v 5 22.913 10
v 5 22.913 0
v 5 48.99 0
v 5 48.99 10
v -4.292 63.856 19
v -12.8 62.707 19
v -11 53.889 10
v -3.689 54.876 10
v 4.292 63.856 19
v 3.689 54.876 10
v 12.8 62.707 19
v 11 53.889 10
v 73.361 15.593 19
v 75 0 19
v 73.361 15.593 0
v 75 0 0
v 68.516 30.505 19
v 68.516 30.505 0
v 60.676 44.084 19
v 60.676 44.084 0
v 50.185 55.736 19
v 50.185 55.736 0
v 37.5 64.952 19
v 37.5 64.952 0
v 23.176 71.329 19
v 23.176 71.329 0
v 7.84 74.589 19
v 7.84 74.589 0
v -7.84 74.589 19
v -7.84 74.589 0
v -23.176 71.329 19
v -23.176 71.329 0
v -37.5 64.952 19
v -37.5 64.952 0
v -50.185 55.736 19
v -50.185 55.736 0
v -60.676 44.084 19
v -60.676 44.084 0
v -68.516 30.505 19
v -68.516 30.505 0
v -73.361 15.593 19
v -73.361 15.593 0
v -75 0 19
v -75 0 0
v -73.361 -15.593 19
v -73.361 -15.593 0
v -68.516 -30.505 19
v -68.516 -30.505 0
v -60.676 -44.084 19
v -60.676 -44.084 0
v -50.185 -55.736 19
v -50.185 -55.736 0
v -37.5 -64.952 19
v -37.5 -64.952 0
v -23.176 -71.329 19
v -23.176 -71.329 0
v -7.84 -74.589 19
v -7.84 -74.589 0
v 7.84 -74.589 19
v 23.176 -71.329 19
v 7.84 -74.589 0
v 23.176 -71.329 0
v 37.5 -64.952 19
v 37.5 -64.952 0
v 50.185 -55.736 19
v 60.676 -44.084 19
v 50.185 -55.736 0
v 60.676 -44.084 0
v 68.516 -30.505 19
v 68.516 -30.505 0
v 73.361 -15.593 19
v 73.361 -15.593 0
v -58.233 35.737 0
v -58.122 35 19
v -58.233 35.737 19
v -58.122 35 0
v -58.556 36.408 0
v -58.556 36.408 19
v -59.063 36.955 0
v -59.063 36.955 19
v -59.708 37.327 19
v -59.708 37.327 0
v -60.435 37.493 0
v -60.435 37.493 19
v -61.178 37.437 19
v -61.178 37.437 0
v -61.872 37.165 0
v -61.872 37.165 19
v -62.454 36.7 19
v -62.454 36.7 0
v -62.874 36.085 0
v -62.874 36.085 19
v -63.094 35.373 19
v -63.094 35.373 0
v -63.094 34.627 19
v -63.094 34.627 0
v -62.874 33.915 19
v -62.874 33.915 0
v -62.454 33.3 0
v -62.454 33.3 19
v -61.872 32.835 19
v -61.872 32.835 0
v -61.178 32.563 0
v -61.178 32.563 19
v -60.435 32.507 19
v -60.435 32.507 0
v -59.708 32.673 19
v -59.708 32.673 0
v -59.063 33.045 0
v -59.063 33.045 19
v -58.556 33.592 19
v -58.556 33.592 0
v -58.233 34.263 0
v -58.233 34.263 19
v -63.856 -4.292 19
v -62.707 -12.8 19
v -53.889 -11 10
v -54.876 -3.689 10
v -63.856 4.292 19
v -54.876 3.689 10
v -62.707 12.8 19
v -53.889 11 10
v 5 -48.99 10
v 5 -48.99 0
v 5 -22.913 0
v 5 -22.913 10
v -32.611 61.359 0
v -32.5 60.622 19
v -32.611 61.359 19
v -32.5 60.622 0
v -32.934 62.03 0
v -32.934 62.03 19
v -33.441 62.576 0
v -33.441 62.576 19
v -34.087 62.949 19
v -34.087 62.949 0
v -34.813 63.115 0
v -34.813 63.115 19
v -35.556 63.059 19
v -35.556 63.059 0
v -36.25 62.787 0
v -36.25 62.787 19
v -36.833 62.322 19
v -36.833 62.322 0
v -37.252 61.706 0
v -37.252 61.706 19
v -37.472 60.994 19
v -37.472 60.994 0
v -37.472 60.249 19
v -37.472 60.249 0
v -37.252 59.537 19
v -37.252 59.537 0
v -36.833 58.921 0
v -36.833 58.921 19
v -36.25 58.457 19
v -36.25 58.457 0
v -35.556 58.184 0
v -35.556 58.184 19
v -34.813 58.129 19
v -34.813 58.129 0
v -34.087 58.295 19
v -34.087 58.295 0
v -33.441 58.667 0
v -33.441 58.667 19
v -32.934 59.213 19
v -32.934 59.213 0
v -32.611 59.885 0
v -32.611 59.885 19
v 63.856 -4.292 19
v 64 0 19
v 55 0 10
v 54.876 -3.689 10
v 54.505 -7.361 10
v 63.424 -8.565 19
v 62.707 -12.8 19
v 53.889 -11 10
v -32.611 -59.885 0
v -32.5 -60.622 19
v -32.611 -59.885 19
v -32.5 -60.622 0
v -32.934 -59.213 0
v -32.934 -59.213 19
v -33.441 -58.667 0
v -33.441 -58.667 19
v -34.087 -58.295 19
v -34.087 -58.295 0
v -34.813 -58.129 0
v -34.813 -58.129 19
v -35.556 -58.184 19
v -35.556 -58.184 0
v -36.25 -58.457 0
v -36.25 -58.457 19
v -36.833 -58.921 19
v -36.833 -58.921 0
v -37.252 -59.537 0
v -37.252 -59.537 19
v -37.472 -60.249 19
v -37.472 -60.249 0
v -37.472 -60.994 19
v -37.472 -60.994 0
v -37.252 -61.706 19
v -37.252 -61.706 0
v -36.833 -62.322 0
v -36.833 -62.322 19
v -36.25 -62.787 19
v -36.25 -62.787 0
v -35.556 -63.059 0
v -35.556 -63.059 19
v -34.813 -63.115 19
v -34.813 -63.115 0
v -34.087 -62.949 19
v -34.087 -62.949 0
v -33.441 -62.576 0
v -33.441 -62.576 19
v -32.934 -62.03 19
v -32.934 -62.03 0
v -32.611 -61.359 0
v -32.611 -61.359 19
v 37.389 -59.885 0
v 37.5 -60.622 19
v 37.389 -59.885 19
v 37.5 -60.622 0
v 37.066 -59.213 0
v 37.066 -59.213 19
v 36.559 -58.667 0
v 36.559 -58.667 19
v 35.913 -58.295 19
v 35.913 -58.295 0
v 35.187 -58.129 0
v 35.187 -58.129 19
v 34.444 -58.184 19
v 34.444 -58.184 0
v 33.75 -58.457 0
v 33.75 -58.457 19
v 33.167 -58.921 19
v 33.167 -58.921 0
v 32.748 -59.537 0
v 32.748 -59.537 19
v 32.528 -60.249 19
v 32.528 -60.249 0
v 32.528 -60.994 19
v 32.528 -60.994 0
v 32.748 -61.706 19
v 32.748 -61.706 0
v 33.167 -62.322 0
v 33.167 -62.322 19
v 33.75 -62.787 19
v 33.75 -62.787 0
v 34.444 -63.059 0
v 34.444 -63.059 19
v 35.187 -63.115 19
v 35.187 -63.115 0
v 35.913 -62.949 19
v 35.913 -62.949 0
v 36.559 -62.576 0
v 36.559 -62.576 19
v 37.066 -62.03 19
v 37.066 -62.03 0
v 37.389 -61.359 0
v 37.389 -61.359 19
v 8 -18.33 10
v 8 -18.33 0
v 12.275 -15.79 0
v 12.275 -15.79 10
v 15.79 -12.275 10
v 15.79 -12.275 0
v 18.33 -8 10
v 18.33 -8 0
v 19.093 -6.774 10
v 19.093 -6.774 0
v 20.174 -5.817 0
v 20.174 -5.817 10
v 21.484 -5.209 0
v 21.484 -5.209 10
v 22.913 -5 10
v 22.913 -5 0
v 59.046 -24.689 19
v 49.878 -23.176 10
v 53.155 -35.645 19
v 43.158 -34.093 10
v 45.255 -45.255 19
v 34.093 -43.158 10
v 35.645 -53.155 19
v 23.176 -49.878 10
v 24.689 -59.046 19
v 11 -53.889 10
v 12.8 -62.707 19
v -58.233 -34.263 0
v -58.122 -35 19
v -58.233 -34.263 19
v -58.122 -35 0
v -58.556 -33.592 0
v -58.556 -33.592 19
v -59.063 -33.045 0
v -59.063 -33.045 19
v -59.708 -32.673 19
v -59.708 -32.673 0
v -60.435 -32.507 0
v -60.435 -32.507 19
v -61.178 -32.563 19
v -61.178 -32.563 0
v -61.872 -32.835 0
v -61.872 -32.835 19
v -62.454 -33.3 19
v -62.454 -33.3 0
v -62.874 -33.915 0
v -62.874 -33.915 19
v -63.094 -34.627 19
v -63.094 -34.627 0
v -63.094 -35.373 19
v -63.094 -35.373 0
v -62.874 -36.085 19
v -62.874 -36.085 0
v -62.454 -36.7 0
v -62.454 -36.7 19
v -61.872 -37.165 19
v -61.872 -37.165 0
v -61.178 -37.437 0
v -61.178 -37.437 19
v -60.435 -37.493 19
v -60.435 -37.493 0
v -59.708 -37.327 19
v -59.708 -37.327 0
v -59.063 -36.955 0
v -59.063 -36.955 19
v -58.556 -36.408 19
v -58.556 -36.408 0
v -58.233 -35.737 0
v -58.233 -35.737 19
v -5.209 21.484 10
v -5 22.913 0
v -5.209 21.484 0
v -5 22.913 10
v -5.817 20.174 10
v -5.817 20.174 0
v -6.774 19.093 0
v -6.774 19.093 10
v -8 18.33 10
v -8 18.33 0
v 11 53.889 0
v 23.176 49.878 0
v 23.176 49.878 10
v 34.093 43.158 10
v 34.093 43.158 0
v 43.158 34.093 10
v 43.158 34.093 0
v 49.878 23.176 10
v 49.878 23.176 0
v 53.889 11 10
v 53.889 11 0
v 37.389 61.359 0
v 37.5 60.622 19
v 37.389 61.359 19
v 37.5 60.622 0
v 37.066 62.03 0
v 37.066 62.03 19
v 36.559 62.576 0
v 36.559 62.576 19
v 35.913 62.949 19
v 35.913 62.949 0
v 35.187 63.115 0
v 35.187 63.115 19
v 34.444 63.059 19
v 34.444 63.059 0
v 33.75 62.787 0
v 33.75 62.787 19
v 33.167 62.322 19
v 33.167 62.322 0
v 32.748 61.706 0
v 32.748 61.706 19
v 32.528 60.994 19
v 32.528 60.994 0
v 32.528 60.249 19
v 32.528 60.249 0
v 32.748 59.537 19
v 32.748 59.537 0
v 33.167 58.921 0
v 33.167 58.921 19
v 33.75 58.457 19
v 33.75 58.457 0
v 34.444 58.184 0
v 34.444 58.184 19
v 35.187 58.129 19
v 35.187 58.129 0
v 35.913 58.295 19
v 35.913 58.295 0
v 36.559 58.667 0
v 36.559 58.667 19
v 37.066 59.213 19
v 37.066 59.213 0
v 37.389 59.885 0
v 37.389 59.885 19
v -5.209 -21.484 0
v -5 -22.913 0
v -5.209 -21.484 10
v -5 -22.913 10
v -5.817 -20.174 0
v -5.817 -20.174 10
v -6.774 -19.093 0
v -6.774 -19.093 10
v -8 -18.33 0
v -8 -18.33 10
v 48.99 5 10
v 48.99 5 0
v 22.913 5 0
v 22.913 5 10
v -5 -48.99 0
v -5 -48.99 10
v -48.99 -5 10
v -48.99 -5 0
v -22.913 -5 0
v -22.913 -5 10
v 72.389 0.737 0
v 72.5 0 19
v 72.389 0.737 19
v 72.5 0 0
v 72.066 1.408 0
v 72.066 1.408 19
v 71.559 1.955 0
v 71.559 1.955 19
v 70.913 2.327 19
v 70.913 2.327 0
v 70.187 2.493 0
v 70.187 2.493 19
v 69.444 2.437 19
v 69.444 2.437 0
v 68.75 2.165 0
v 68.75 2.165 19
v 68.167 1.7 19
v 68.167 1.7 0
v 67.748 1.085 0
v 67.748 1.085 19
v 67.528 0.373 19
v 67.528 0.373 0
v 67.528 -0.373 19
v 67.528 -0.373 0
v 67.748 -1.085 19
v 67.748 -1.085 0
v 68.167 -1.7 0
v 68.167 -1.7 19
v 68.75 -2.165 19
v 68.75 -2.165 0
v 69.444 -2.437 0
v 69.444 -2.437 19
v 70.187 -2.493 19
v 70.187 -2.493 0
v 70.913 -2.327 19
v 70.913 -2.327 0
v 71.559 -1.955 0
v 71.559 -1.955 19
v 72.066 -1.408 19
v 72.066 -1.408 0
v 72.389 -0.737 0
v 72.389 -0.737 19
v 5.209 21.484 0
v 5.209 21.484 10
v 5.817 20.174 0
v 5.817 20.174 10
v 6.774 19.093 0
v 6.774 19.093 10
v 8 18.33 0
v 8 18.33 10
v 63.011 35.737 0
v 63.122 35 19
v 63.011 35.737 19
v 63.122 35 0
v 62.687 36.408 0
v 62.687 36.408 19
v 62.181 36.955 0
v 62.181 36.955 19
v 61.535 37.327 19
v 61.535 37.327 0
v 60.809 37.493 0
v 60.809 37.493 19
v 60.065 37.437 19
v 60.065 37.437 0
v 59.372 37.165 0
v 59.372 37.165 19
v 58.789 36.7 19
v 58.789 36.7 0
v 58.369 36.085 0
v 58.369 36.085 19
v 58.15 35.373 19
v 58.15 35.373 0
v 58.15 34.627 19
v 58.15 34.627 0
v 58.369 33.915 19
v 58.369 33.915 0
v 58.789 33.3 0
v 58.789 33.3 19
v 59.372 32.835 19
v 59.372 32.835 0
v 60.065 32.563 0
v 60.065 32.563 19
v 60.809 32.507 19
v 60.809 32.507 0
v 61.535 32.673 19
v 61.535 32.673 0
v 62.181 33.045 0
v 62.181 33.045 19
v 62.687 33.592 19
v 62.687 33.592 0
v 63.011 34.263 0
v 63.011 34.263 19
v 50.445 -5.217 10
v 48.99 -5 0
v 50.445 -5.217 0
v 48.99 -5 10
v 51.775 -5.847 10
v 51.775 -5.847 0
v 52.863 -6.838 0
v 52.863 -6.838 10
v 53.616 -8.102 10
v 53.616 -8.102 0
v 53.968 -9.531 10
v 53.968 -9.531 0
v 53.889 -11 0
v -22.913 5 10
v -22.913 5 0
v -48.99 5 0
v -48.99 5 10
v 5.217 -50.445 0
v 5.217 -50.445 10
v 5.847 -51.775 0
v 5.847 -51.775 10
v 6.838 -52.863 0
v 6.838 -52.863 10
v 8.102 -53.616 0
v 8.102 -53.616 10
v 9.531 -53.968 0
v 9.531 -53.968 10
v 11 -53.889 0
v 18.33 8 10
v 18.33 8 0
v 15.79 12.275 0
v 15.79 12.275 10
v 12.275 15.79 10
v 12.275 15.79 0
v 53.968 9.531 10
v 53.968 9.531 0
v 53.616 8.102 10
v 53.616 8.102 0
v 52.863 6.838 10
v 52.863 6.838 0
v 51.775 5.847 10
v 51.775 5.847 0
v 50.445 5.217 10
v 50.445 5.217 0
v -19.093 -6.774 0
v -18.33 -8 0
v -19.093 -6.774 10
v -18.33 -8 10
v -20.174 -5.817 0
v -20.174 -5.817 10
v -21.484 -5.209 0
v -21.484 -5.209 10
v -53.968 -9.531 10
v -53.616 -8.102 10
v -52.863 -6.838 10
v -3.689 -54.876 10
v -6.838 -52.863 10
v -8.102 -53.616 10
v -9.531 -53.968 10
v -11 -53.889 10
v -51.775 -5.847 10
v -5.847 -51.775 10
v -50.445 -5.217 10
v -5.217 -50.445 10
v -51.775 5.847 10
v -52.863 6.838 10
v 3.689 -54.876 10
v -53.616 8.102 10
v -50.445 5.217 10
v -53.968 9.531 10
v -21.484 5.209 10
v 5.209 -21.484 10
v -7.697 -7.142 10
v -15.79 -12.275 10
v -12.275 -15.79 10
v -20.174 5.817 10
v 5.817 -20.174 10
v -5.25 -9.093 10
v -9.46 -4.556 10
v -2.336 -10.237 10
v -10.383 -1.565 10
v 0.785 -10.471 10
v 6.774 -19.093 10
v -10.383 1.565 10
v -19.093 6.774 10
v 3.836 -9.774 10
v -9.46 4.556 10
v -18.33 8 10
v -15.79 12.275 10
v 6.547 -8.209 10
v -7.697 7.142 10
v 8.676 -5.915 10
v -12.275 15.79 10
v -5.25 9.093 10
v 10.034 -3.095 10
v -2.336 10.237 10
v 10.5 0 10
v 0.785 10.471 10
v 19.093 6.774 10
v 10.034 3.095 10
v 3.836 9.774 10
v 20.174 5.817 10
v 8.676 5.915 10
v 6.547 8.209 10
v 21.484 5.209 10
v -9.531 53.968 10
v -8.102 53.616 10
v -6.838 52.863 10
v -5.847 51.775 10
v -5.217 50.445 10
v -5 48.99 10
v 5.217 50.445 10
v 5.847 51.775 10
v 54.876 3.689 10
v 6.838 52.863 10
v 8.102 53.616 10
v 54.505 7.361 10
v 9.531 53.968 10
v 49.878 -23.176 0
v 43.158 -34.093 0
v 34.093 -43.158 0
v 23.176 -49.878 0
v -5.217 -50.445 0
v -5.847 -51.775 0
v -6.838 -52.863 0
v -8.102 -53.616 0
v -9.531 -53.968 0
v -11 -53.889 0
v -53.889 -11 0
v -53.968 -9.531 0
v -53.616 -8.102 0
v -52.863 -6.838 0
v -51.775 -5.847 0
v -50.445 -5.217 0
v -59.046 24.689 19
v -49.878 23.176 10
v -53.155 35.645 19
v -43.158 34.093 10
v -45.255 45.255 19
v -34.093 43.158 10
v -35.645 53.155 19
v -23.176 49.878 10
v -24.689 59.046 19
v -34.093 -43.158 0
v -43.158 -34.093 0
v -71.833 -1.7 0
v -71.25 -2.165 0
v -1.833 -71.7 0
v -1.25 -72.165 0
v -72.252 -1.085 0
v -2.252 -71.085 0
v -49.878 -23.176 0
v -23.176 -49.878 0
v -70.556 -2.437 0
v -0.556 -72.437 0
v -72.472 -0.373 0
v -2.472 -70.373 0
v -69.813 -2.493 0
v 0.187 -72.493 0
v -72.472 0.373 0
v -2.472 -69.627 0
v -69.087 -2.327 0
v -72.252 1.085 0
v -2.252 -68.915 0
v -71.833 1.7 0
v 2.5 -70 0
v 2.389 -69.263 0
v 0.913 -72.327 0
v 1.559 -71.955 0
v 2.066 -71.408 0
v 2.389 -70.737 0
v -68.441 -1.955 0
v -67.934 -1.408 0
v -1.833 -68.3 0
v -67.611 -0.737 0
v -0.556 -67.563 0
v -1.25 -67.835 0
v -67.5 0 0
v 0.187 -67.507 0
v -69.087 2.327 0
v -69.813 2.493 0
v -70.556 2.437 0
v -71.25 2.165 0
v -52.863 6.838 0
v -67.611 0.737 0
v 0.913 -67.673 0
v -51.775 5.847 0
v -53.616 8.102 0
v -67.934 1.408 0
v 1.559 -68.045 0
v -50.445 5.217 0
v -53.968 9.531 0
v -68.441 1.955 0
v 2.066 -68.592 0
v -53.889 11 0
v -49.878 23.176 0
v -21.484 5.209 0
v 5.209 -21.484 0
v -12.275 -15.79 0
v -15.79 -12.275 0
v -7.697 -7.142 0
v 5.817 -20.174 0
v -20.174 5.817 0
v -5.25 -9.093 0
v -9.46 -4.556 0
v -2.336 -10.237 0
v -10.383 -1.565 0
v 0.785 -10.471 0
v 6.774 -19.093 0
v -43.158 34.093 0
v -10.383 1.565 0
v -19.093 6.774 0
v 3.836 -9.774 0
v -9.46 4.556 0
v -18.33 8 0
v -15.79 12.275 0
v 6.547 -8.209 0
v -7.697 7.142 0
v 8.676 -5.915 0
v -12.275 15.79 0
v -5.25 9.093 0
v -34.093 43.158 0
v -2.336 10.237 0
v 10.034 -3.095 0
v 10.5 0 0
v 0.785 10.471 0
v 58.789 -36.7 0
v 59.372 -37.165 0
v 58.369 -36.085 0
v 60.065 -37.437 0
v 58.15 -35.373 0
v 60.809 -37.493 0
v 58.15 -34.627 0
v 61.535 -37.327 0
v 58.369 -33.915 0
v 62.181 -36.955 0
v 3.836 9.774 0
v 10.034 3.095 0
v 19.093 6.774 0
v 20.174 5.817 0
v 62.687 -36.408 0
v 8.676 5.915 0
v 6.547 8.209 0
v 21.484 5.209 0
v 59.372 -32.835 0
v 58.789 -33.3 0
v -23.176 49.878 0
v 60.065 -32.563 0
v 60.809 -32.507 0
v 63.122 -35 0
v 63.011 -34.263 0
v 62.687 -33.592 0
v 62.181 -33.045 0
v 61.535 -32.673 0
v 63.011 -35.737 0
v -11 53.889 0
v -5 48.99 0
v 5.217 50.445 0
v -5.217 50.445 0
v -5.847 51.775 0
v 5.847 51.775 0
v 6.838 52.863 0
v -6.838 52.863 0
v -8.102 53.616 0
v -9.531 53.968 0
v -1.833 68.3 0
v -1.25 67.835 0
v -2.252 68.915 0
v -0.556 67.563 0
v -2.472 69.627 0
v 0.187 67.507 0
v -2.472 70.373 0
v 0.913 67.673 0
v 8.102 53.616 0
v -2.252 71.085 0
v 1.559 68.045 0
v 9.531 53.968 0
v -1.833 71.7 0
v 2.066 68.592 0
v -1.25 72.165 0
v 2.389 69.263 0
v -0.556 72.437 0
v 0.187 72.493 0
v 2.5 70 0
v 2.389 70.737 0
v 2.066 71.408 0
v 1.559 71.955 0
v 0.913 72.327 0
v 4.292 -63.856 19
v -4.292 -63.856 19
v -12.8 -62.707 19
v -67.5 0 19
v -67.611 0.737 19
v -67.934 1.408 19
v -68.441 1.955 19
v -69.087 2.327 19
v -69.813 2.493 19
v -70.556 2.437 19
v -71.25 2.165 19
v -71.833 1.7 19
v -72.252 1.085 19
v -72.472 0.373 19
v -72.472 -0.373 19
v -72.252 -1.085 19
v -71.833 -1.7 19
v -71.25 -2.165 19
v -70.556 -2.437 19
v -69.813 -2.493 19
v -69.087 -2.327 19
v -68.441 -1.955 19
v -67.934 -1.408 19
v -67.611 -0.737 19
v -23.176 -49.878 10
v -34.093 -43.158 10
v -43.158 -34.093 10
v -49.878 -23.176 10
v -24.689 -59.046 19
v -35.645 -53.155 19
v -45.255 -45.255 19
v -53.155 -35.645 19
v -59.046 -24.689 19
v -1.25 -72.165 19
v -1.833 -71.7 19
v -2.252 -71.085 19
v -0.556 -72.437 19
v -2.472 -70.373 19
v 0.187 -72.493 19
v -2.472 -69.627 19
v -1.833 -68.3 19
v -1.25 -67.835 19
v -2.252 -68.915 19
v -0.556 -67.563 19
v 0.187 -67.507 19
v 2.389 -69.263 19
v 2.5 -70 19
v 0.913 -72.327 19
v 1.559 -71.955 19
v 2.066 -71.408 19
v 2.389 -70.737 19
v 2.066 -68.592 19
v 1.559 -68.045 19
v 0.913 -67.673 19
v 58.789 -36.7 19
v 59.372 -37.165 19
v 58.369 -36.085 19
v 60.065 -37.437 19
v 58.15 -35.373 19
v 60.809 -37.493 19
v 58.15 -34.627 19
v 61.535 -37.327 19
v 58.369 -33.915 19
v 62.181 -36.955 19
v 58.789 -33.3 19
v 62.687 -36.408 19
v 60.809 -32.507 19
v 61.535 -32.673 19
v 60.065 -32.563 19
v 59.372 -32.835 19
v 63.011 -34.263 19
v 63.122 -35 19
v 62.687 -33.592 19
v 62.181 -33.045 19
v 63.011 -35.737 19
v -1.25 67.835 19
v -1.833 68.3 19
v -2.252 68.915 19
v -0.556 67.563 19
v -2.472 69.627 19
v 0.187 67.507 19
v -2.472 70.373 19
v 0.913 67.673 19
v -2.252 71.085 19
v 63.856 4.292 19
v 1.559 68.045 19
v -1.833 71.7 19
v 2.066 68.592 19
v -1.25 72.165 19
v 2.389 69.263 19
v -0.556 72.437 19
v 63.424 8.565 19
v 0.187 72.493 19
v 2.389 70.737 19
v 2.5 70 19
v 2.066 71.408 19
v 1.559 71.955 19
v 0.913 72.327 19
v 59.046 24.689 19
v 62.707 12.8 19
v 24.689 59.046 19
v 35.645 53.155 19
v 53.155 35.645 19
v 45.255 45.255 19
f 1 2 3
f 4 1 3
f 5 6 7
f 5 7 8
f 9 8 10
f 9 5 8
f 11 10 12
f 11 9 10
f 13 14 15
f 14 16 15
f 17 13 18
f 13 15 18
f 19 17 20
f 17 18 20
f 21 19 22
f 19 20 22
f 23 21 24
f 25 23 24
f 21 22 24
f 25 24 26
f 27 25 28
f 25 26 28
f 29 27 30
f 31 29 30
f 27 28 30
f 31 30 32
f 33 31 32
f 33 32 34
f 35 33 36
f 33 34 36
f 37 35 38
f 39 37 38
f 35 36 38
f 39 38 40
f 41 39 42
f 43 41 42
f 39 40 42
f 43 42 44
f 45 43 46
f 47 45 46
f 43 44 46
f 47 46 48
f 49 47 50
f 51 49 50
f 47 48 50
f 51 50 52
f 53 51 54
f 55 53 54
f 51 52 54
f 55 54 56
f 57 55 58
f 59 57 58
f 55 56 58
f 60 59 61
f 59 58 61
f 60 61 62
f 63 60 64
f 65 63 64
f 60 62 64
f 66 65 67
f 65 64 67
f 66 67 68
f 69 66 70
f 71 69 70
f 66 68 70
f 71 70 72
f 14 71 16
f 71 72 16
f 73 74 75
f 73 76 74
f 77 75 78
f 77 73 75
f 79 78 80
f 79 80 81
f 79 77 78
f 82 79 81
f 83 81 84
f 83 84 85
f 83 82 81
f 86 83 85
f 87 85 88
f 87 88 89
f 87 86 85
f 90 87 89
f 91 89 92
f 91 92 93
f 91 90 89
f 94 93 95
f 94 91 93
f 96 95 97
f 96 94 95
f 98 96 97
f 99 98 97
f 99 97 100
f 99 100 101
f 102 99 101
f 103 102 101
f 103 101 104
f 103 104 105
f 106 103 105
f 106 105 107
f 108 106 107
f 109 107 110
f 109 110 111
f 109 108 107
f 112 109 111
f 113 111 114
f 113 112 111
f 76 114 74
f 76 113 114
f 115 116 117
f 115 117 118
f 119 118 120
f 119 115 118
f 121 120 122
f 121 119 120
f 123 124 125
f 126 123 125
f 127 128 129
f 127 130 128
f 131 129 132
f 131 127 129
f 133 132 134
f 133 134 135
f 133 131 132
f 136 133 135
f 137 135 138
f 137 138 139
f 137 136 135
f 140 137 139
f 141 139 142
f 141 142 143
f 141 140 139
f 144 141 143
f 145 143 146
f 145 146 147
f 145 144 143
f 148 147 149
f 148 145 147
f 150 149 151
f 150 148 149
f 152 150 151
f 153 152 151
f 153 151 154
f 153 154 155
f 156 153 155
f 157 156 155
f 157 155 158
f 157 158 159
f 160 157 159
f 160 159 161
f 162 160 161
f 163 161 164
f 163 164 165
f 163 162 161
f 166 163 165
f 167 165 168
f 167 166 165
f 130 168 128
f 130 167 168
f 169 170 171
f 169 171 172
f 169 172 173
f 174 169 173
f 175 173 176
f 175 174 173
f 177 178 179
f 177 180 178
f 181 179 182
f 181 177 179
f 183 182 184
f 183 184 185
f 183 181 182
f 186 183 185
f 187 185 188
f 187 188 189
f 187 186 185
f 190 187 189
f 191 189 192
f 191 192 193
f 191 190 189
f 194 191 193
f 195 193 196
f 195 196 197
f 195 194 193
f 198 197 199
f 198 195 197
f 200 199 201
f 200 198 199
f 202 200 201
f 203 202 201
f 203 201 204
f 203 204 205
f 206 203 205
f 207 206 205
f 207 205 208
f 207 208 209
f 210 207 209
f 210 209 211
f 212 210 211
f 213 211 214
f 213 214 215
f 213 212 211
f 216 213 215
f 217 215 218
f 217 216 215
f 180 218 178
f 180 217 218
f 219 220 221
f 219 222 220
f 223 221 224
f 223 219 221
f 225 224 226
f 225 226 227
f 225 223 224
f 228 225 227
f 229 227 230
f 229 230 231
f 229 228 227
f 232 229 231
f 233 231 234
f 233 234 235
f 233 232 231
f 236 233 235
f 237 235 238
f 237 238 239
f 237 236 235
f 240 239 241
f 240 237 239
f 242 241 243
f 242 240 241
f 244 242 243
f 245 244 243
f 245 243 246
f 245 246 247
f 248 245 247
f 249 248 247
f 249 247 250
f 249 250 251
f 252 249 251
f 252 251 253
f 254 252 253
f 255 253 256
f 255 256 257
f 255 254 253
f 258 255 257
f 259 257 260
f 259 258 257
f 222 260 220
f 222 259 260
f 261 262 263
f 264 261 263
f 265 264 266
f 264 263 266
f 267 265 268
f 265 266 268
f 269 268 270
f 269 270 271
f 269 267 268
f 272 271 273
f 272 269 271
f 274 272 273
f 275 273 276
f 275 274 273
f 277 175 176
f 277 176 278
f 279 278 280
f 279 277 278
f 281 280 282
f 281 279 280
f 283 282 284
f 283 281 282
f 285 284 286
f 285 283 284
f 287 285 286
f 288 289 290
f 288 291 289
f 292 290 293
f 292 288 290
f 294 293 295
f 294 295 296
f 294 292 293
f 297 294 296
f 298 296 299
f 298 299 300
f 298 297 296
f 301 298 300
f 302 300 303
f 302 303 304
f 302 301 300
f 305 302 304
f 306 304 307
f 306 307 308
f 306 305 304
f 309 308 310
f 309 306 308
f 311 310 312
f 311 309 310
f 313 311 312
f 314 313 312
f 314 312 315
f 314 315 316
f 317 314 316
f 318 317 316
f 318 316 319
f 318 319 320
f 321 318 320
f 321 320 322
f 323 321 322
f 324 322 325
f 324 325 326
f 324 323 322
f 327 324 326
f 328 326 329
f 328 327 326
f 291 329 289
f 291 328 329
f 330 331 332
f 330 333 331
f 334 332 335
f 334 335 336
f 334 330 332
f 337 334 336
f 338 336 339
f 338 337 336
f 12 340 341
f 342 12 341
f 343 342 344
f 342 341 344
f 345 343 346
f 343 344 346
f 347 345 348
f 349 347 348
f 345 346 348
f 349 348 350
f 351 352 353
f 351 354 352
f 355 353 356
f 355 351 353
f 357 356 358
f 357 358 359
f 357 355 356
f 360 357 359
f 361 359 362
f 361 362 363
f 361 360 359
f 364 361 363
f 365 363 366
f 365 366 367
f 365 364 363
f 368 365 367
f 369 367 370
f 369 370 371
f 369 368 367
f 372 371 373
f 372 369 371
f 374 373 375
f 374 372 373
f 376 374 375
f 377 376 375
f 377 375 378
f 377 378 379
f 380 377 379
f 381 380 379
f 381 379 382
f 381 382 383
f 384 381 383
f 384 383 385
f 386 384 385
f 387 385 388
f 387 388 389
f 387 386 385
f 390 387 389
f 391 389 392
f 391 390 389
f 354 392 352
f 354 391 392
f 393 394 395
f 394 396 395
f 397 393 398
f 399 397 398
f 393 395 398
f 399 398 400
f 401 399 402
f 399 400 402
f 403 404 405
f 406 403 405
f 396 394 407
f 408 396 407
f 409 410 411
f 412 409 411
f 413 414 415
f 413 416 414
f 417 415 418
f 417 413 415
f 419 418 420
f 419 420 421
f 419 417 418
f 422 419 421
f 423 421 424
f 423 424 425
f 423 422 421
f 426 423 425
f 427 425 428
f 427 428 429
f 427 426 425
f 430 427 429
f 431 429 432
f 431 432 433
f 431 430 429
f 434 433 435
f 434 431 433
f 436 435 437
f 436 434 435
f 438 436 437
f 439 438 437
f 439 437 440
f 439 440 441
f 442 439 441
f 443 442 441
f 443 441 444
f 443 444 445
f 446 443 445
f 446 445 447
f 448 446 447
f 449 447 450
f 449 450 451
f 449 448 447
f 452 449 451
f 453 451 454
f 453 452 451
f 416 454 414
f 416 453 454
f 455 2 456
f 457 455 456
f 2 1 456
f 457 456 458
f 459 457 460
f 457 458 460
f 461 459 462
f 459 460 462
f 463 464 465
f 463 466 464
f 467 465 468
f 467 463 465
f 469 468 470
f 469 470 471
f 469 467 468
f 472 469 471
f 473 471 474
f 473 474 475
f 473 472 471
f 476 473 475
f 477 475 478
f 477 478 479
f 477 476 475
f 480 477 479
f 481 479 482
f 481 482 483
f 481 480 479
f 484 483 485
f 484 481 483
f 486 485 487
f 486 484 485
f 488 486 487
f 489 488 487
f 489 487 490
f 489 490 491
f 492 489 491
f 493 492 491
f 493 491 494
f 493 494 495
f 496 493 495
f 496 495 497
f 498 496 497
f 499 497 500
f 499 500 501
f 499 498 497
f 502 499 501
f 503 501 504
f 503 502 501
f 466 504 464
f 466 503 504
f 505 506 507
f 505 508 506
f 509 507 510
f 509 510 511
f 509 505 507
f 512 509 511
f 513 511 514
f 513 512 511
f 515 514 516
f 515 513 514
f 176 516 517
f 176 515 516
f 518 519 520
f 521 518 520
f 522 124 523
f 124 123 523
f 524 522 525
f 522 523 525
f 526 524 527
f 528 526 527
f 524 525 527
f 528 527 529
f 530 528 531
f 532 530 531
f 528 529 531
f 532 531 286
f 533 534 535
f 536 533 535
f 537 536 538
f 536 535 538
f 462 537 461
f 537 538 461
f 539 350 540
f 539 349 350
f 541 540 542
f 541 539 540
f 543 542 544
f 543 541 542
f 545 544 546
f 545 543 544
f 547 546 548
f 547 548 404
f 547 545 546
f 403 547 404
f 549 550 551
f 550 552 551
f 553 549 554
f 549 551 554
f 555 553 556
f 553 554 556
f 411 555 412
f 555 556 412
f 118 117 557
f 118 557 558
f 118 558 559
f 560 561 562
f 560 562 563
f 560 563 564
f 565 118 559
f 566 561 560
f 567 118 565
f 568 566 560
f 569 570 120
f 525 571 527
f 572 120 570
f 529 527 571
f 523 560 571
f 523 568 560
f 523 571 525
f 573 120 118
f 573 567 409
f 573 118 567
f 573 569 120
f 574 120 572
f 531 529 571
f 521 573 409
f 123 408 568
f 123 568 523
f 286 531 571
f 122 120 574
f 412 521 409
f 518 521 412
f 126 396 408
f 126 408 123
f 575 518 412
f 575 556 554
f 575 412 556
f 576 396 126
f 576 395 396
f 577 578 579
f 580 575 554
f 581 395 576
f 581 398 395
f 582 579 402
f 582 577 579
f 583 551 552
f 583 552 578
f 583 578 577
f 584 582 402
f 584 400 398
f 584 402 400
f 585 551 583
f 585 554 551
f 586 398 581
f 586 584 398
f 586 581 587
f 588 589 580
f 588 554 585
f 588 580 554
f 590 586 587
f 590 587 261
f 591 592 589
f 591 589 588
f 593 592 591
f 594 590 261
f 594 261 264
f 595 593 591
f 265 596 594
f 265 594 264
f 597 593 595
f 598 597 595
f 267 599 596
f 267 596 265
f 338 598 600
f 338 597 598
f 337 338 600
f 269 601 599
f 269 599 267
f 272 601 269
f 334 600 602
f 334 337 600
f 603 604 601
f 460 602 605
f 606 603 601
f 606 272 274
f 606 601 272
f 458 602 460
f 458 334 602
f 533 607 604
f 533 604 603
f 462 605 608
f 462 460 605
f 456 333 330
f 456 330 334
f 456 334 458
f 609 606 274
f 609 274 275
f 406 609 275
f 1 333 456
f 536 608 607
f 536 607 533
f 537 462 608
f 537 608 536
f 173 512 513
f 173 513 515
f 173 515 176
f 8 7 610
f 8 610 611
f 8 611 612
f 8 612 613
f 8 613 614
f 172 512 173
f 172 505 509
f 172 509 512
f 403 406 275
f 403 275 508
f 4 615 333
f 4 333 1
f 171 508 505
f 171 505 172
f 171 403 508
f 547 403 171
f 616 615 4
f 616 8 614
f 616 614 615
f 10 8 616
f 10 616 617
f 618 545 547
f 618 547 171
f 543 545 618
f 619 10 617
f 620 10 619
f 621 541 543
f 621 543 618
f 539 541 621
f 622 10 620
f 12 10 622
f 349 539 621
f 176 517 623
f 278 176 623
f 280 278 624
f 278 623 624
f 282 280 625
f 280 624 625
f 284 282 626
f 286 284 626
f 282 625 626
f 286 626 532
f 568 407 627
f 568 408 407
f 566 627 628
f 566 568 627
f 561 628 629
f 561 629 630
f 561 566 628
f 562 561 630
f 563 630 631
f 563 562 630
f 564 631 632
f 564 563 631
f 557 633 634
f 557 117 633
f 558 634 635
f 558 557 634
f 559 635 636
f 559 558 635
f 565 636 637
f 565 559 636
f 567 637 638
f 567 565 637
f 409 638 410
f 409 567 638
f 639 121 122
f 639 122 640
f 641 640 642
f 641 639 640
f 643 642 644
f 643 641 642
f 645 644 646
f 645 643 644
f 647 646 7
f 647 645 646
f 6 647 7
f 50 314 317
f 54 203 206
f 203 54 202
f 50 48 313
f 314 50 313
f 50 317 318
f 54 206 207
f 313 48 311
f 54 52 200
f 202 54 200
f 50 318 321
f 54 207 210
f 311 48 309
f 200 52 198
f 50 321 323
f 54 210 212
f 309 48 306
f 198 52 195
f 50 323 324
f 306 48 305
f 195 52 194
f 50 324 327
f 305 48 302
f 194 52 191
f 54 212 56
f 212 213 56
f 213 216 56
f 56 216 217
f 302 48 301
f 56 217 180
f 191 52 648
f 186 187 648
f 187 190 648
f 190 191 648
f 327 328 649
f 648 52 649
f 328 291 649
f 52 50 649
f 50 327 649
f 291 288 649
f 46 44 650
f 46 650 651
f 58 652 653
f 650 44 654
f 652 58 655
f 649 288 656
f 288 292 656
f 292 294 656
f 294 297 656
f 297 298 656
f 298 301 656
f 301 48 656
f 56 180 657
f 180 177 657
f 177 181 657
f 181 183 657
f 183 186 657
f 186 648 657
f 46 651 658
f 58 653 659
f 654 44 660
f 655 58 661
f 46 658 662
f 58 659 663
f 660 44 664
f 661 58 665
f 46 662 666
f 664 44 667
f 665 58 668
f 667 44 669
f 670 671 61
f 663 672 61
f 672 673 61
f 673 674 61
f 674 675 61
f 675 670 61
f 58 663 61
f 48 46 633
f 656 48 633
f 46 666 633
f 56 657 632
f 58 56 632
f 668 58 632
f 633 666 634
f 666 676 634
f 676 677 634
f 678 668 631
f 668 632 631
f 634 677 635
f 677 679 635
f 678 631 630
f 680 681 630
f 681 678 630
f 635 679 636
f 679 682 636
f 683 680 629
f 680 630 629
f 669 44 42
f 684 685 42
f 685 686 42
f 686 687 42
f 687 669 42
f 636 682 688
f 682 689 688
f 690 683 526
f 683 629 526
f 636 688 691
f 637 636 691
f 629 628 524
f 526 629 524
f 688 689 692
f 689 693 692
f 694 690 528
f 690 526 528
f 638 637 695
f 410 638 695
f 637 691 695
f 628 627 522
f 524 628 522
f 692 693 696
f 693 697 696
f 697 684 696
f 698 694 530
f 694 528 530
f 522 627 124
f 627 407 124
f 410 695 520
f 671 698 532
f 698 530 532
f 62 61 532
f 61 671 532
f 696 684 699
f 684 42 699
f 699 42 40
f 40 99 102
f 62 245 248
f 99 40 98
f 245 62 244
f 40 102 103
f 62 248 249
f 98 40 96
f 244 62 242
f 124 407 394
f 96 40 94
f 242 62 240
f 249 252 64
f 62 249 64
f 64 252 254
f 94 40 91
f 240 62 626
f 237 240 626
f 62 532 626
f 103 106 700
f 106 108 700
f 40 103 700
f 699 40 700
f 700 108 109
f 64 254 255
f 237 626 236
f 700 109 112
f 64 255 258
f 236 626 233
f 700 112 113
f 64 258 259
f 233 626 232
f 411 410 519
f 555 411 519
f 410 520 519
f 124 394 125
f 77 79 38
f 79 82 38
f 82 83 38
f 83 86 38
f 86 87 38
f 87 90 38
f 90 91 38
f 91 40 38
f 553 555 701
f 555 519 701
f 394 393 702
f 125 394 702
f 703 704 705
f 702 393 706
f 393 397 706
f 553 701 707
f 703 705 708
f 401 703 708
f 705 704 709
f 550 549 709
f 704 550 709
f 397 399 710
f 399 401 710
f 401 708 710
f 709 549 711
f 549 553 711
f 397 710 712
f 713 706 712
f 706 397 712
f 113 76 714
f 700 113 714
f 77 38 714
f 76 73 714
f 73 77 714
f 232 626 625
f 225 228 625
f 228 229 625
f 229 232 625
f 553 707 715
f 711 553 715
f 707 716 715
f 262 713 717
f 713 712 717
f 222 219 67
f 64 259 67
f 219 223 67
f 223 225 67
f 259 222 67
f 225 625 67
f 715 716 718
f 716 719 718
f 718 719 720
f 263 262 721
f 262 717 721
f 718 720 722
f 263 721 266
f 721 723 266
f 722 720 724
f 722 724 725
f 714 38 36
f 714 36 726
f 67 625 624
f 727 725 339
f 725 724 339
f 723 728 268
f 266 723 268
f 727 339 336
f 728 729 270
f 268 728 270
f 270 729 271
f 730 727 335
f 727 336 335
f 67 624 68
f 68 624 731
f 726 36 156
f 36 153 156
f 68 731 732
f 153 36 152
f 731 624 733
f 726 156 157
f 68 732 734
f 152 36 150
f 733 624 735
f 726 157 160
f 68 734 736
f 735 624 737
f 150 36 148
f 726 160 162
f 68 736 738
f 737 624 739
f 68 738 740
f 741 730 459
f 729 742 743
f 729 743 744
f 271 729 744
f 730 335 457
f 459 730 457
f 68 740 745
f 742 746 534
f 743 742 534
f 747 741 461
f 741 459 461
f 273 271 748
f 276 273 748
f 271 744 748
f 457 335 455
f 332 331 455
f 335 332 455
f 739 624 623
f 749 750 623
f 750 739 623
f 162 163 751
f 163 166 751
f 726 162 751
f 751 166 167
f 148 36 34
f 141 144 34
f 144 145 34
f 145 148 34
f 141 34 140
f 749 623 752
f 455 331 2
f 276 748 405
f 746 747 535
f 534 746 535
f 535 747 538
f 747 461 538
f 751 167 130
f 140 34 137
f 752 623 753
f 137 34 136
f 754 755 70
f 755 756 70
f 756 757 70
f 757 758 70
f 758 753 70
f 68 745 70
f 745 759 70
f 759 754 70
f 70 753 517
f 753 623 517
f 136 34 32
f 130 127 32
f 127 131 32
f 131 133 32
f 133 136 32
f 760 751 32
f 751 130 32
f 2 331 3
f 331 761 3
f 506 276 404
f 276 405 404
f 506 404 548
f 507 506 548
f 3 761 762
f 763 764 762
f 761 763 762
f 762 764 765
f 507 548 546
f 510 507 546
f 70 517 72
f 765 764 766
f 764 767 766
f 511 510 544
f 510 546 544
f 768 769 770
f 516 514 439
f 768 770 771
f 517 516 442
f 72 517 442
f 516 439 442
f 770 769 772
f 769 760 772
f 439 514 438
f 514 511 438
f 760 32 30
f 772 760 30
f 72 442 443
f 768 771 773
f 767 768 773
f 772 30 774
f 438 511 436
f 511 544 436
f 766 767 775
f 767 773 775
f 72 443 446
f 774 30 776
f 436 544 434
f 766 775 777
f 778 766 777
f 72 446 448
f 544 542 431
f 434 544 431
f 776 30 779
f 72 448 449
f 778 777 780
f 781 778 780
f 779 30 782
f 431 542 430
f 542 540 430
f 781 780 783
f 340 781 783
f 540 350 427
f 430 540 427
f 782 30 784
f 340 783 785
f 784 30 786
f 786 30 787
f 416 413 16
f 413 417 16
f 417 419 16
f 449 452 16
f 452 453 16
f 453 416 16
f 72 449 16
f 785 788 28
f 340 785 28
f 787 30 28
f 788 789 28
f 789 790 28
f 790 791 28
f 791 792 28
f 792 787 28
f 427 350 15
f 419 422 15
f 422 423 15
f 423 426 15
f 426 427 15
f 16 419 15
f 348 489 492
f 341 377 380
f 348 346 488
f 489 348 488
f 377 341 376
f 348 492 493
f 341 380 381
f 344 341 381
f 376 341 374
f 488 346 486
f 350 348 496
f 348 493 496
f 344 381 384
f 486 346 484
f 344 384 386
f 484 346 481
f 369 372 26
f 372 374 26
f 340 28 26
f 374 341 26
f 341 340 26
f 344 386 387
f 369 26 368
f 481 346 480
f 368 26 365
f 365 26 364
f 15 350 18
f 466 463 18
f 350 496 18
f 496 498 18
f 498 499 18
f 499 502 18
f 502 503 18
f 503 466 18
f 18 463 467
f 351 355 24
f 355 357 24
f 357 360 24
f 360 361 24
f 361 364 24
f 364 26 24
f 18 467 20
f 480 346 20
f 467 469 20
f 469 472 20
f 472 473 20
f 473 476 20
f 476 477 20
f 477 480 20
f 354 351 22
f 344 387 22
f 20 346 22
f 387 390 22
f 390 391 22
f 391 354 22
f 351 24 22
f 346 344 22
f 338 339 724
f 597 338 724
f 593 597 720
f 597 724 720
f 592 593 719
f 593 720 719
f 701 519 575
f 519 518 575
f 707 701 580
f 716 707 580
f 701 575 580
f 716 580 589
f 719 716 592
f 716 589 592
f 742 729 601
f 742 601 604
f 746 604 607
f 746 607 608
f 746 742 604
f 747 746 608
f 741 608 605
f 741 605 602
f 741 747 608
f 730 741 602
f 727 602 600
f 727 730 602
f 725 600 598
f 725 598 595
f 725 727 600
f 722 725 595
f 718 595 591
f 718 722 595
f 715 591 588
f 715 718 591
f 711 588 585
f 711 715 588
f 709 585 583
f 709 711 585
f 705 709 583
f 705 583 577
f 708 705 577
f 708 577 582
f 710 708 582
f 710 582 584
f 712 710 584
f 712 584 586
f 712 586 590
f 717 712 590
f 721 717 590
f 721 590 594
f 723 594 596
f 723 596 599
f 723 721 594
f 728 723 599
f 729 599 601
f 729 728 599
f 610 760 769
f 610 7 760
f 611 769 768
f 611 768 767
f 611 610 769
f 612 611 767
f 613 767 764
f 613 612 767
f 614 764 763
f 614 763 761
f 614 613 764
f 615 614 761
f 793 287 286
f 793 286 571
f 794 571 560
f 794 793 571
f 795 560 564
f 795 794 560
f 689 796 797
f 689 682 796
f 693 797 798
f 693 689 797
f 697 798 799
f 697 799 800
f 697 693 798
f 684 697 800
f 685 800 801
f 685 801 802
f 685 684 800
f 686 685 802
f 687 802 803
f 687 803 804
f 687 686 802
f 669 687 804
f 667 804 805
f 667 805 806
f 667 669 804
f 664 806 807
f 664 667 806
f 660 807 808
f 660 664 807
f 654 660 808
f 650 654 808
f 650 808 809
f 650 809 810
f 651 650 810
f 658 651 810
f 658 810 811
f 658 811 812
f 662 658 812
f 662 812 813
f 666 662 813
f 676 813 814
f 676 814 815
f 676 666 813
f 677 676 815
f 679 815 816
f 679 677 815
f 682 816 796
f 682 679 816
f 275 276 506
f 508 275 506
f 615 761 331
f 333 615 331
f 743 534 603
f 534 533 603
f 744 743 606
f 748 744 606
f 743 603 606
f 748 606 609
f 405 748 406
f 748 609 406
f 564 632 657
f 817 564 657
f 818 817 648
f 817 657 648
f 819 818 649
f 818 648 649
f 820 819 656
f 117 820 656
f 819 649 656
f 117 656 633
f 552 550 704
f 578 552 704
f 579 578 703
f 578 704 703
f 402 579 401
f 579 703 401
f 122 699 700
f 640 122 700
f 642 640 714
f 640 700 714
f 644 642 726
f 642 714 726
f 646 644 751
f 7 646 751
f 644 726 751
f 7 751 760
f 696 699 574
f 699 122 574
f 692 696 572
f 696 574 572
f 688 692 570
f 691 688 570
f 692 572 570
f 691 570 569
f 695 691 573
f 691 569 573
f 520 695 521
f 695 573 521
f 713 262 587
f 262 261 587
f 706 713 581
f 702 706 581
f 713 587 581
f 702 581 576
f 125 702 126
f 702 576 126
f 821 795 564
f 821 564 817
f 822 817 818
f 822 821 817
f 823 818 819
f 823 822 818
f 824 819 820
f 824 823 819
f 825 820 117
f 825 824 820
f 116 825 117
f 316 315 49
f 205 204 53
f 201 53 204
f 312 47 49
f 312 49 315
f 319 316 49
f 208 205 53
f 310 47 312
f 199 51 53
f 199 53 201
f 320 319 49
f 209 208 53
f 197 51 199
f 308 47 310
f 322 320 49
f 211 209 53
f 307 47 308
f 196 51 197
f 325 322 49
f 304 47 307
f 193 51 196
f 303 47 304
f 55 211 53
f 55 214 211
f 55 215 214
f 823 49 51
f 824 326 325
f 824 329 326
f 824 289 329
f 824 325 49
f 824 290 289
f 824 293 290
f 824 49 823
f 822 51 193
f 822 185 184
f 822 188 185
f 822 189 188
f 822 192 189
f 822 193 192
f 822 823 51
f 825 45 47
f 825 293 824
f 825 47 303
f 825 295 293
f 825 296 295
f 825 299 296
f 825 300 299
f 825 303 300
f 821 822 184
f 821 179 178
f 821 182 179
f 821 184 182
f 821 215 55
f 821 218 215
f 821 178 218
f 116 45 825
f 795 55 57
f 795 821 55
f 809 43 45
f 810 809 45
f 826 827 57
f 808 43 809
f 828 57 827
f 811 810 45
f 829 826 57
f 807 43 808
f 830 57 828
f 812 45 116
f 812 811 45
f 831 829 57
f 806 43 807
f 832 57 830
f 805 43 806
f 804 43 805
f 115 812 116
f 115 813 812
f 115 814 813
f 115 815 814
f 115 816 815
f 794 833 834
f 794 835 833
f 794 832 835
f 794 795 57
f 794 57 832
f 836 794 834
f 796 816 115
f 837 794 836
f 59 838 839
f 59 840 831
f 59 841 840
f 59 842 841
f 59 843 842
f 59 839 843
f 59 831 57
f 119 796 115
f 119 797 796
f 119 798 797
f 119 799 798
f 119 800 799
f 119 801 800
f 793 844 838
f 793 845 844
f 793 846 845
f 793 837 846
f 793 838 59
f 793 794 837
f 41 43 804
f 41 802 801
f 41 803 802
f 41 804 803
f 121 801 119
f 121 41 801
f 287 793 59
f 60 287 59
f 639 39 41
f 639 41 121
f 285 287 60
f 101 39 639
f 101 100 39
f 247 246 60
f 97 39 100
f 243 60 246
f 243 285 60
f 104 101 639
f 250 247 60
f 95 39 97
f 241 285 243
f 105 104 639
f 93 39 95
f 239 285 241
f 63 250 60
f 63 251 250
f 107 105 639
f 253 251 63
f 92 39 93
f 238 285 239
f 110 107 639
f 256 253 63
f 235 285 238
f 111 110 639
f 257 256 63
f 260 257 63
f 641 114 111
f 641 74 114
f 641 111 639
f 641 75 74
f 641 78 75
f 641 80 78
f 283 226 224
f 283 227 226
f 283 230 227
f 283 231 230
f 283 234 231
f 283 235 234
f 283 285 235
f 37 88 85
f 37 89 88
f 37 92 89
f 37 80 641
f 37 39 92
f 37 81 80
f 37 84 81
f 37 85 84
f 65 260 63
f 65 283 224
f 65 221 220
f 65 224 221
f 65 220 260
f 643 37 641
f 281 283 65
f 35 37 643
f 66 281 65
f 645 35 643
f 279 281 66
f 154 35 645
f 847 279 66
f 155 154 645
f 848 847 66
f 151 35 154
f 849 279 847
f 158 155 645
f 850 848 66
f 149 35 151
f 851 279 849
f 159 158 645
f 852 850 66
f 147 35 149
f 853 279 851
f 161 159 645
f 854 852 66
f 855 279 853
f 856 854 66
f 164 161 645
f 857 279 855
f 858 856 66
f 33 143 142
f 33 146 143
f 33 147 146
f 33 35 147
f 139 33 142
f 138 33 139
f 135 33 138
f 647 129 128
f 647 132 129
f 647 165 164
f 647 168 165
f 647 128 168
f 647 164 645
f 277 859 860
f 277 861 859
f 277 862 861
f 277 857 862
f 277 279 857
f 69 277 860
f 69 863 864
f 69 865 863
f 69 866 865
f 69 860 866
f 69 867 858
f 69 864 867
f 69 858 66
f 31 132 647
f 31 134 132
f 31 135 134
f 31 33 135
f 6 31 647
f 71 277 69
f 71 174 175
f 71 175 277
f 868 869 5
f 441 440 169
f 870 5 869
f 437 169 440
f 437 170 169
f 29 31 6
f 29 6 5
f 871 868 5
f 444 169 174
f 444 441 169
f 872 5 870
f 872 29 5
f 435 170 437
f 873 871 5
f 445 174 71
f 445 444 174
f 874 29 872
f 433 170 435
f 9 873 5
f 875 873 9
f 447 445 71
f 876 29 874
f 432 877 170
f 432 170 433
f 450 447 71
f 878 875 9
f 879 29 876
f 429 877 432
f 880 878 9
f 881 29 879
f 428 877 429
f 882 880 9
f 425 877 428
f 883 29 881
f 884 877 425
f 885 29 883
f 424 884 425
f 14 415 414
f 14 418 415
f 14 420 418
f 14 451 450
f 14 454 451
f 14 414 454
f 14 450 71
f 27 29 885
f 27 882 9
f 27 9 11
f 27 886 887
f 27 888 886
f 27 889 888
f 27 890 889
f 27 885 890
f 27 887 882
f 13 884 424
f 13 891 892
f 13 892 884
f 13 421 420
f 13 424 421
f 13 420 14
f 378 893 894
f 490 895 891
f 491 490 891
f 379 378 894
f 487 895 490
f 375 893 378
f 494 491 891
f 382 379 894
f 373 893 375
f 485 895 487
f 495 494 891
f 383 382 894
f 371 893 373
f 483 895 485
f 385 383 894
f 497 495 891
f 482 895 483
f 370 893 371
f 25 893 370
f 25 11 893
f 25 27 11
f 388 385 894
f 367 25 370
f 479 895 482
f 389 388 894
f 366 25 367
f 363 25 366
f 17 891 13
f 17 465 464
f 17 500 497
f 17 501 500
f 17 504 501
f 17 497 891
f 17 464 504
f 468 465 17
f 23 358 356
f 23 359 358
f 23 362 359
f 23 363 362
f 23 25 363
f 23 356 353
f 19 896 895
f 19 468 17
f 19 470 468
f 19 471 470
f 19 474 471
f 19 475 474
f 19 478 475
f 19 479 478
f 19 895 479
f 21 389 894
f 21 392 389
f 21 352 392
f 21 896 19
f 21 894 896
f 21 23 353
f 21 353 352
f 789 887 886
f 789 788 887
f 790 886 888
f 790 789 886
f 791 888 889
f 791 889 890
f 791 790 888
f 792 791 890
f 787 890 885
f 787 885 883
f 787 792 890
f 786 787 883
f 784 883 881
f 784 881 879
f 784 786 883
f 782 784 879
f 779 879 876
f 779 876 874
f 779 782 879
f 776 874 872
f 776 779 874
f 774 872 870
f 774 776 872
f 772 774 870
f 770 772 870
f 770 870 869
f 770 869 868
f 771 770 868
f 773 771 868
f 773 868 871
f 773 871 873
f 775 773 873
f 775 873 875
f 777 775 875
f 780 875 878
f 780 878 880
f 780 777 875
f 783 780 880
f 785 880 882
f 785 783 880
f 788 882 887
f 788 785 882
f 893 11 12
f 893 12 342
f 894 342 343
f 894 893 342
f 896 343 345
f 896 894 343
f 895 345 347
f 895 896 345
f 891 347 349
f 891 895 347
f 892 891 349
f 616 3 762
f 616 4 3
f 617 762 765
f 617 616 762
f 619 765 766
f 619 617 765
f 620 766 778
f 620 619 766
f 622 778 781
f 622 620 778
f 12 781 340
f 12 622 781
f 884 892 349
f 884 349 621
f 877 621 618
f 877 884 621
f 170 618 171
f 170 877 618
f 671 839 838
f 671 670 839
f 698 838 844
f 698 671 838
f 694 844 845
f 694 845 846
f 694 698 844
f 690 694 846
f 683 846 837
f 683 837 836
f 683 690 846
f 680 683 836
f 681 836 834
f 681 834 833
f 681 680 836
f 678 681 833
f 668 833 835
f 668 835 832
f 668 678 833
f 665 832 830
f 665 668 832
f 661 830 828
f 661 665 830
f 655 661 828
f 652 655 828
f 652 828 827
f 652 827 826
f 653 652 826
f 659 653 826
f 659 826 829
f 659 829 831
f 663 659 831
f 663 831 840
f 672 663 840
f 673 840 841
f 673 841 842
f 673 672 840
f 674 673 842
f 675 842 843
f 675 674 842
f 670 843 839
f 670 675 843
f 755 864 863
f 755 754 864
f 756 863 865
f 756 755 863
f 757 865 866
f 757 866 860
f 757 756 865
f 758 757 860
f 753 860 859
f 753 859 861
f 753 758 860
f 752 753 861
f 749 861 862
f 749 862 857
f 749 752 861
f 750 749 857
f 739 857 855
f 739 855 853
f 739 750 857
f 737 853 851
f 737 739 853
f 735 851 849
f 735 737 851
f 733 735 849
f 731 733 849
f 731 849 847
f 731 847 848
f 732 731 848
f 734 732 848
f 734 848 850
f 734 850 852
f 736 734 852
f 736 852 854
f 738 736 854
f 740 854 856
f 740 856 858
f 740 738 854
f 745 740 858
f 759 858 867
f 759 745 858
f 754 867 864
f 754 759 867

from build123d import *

# Parameters (mm, degrees)
F0_R     = 75
F0_R_2   = 2.5
F0_R_3   = 10.5
F1_DEPTH = 10
F2_R     = 5
F3_R     = 75
F3_R_2   = 2.5
F4_DEPTH = 9
F5_SIZE  = 8.99999


# Not quite as in the source:
# - a fillet or chamfer is up to 0.001 mm smaller than in the source, because OpenCascade refuses the exact size


with BuildPart() as f1:
    # F0 (on Top) → F1 (new body)
    with BuildSketch(Plane.XY):
        Circle(F0_R)
        with Locations((-35, -60.6217782649)):
            Circle(F0_R_2, mode=Mode.SUBTRACT)
        with Locations((-60.6217782649, -35)):
            Circle(F0_R_2, mode=Mode.SUBTRACT)
        with BuildLine():
            ThreePointArc((-5, -54.7722557505), (-38.8908729653, -38.8908729653), (-54.7722557505, -5))
            Line((-54.7722557505, -5), (-19.364916731, -5))
            ThreePointArc((-19.364916731, -5), (-14.1421356237, -14.1421356237), (-5, -19.364916731))
            Line((-5, -19.364916731), (-5, -54.7722557505))
        make_face(mode=Mode.SUBTRACT)
        with Locations((0, -70)):
            Circle(F0_R_2, mode=Mode.SUBTRACT)
        with Locations((35, -60.6217782649)):
            Circle(F0_R_2, mode=Mode.SUBTRACT)
        with BuildLine():
            Line((19.364916731, -5), (54.7722557505, -5))
            ThreePointArc((54.7722557505, -5), (38.8908729653, -38.8908729653), (5, -54.7722557505))
            Line((5, -54.7722557505), (5, -19.364916731))
            ThreePointArc((5, -19.364916731), (14.1421356237, -14.1421356237), (19.364916731, -5))
        make_face(mode=Mode.SUBTRACT)
        with Locations((60.6217782649, -35)):
            Circle(F0_R_2, mode=Mode.SUBTRACT)
        with Locations((-70, 0)):
            Circle(F0_R_2, mode=Mode.SUBTRACT)
        with Locations((-60.6217782649, 35)):
            Circle(F0_R_2, mode=Mode.SUBTRACT)
        with BuildLine():
            Line((-5, 54.7722557505), (-5, 19.364916731))
            ThreePointArc((-5, 19.364916731), (-14.1421356237, 14.1421356237), (-19.364916731, 5))
            Line((-19.364916731, 5), (-54.7722557505, 5))
            ThreePointArc((-54.7722557505, 5), (-38.8908729653, 38.8908729653), (-5, 54.7722557505))
        make_face(mode=Mode.SUBTRACT)
        with Locations((-35, 60.6217782649)):
            Circle(F0_R_2, mode=Mode.SUBTRACT)
        Circle(F0_R_3, mode=Mode.SUBTRACT)
        with BuildLine():
            ThreePointArc((5, 54.7722557505), (38.8908729653, 38.8908729653), (54.7722557505, 5))
            Line((54.7722557505, 5), (19.364916731, 5))
            ThreePointArc((19.364916731, 5), (14.1421356237, 14.1421356237), (5, 19.364916731))
            Line((5, 19.364916731), (5, 54.7722557505))
        make_face(mode=Mode.SUBTRACT)
        with Locations((70, 0)):
            Circle(F0_R_2, mode=Mode.SUBTRACT)
        with Locations((60.6217782649, 35)):
            Circle(F0_R_2, mode=Mode.SUBTRACT)
        with Locations((0, 70)):
            Circle(F0_R_2, mode=Mode.SUBTRACT)
        with Locations((35, 60.6217782649)):
            Circle(F0_R_2, mode=Mode.SUBTRACT)
    extrude(amount=F1_DEPTH)

    # F2
    f2_edges = [f1.edges().sort_by_distance(p)[0] for p in [
        (5, -54.772256, 5),
        (5, -19.364917, 5),
        (19.364917, -5, 5),
        (19.364917, 5, 5),
        (5, 19.364917, 5),
        (-5, 19.364917, 5),
        (-19.364917, 5, 5),
        (-5, -19.364917, 5),
        (-19.364917, -5, 5),
        (54.772256, 5, 5),
        (54.772256, -5, 5),
        (5, 54.772256, 5),
        (-54.772256, -5, 5),
        (-5, 54.772256, 5),
        (-5, -54.772256, 5),
        (-54.772256, 5, 5),
    ]]
    fillet(f2_edges, radius=F2_R)

    # F3 (on face) → F4 (join)
    with BuildSketch(Plane.XY.offset(10)):
        Circle(F3_R)
        with Locations((-35, -60.6217782649)):
            Circle(F3_R_2, mode=Mode.SUBTRACT)
        with Locations((-60.6217782649, -35)):
            Circle(F3_R_2, mode=Mode.SUBTRACT)
        with Locations((0, -70)):
            Circle(F3_R_2, mode=Mode.SUBTRACT)
        with Locations((35, -60.6217782649)):
            Circle(F3_R_2, mode=Mode.SUBTRACT)
        with Locations((60.6217782649, -35)):
            Circle(F3_R_2, mode=Mode.SUBTRACT)
        with Locations((-70, 0)):
            Circle(F3_R_2, mode=Mode.SUBTRACT)
        with Locations((-60.6217782649, 35)):
            Circle(F3_R_2, mode=Mode.SUBTRACT)
        with Locations((-35, 60.6217782649)):
            Circle(F3_R_2, mode=Mode.SUBTRACT)
        with BuildLine():
            ThreePointArc((53.8887743412, 11), (54.7214884153, 5.5279929103), (55, 0))
            ThreePointArc((55, 0), (54.7214884153, -5.5279929103), (53.8887743412, -11))
            ThreePointArc((53.8887743412, -11), (38.8908729653, -38.8908729653), (11, -53.8887743412))
            ThreePointArc((11, -53.8887743412), (0, -55), (-11, -53.8887743412))
            ThreePointArc((-11, -53.8887743412), (-38.8908729653, -38.8908729653), (-53.8887743412, -11))
            ThreePointArc((-53.8887743412, -11), (-55, 0), (-53.8887743412, 11))
            ThreePointArc((-53.8887743412, 11), (-38.8908729653, 38.8908729653), (-11, 53.8887743412))
            ThreePointArc((-11, 53.8887743412), (0, 55), (11, 53.8887743412))
            ThreePointArc((11, 53.8887743412), (38.8908729653, 38.8908729653), (53.8887743412, 11))
        make_face(mode=Mode.SUBTRACT)
        with Locations((70, 0)):
            Circle(F3_R_2, mode=Mode.SUBTRACT)
        with Locations((60.6217782649, 35)):
            Circle(F3_R_2, mode=Mode.SUBTRACT)
        with Locations((0, 70)):
            Circle(F3_R_2, mode=Mode.SUBTRACT)
        with Locations((35, 60.6217782649)):
            Circle(F3_R_2, mode=Mode.SUBTRACT)
    extrude(amount=F4_DEPTH)

    # F5 (size 9 in the source; OpenCascade refuses exactly that, so slightly less here)
    f5_edges = [f1.edges().sort_by_distance(p)[0] for p in [
        (53.888774, 11, 19),
    ]]
    chamfer(f5_edges, length=F5_SIZE)


solid = f1.part
